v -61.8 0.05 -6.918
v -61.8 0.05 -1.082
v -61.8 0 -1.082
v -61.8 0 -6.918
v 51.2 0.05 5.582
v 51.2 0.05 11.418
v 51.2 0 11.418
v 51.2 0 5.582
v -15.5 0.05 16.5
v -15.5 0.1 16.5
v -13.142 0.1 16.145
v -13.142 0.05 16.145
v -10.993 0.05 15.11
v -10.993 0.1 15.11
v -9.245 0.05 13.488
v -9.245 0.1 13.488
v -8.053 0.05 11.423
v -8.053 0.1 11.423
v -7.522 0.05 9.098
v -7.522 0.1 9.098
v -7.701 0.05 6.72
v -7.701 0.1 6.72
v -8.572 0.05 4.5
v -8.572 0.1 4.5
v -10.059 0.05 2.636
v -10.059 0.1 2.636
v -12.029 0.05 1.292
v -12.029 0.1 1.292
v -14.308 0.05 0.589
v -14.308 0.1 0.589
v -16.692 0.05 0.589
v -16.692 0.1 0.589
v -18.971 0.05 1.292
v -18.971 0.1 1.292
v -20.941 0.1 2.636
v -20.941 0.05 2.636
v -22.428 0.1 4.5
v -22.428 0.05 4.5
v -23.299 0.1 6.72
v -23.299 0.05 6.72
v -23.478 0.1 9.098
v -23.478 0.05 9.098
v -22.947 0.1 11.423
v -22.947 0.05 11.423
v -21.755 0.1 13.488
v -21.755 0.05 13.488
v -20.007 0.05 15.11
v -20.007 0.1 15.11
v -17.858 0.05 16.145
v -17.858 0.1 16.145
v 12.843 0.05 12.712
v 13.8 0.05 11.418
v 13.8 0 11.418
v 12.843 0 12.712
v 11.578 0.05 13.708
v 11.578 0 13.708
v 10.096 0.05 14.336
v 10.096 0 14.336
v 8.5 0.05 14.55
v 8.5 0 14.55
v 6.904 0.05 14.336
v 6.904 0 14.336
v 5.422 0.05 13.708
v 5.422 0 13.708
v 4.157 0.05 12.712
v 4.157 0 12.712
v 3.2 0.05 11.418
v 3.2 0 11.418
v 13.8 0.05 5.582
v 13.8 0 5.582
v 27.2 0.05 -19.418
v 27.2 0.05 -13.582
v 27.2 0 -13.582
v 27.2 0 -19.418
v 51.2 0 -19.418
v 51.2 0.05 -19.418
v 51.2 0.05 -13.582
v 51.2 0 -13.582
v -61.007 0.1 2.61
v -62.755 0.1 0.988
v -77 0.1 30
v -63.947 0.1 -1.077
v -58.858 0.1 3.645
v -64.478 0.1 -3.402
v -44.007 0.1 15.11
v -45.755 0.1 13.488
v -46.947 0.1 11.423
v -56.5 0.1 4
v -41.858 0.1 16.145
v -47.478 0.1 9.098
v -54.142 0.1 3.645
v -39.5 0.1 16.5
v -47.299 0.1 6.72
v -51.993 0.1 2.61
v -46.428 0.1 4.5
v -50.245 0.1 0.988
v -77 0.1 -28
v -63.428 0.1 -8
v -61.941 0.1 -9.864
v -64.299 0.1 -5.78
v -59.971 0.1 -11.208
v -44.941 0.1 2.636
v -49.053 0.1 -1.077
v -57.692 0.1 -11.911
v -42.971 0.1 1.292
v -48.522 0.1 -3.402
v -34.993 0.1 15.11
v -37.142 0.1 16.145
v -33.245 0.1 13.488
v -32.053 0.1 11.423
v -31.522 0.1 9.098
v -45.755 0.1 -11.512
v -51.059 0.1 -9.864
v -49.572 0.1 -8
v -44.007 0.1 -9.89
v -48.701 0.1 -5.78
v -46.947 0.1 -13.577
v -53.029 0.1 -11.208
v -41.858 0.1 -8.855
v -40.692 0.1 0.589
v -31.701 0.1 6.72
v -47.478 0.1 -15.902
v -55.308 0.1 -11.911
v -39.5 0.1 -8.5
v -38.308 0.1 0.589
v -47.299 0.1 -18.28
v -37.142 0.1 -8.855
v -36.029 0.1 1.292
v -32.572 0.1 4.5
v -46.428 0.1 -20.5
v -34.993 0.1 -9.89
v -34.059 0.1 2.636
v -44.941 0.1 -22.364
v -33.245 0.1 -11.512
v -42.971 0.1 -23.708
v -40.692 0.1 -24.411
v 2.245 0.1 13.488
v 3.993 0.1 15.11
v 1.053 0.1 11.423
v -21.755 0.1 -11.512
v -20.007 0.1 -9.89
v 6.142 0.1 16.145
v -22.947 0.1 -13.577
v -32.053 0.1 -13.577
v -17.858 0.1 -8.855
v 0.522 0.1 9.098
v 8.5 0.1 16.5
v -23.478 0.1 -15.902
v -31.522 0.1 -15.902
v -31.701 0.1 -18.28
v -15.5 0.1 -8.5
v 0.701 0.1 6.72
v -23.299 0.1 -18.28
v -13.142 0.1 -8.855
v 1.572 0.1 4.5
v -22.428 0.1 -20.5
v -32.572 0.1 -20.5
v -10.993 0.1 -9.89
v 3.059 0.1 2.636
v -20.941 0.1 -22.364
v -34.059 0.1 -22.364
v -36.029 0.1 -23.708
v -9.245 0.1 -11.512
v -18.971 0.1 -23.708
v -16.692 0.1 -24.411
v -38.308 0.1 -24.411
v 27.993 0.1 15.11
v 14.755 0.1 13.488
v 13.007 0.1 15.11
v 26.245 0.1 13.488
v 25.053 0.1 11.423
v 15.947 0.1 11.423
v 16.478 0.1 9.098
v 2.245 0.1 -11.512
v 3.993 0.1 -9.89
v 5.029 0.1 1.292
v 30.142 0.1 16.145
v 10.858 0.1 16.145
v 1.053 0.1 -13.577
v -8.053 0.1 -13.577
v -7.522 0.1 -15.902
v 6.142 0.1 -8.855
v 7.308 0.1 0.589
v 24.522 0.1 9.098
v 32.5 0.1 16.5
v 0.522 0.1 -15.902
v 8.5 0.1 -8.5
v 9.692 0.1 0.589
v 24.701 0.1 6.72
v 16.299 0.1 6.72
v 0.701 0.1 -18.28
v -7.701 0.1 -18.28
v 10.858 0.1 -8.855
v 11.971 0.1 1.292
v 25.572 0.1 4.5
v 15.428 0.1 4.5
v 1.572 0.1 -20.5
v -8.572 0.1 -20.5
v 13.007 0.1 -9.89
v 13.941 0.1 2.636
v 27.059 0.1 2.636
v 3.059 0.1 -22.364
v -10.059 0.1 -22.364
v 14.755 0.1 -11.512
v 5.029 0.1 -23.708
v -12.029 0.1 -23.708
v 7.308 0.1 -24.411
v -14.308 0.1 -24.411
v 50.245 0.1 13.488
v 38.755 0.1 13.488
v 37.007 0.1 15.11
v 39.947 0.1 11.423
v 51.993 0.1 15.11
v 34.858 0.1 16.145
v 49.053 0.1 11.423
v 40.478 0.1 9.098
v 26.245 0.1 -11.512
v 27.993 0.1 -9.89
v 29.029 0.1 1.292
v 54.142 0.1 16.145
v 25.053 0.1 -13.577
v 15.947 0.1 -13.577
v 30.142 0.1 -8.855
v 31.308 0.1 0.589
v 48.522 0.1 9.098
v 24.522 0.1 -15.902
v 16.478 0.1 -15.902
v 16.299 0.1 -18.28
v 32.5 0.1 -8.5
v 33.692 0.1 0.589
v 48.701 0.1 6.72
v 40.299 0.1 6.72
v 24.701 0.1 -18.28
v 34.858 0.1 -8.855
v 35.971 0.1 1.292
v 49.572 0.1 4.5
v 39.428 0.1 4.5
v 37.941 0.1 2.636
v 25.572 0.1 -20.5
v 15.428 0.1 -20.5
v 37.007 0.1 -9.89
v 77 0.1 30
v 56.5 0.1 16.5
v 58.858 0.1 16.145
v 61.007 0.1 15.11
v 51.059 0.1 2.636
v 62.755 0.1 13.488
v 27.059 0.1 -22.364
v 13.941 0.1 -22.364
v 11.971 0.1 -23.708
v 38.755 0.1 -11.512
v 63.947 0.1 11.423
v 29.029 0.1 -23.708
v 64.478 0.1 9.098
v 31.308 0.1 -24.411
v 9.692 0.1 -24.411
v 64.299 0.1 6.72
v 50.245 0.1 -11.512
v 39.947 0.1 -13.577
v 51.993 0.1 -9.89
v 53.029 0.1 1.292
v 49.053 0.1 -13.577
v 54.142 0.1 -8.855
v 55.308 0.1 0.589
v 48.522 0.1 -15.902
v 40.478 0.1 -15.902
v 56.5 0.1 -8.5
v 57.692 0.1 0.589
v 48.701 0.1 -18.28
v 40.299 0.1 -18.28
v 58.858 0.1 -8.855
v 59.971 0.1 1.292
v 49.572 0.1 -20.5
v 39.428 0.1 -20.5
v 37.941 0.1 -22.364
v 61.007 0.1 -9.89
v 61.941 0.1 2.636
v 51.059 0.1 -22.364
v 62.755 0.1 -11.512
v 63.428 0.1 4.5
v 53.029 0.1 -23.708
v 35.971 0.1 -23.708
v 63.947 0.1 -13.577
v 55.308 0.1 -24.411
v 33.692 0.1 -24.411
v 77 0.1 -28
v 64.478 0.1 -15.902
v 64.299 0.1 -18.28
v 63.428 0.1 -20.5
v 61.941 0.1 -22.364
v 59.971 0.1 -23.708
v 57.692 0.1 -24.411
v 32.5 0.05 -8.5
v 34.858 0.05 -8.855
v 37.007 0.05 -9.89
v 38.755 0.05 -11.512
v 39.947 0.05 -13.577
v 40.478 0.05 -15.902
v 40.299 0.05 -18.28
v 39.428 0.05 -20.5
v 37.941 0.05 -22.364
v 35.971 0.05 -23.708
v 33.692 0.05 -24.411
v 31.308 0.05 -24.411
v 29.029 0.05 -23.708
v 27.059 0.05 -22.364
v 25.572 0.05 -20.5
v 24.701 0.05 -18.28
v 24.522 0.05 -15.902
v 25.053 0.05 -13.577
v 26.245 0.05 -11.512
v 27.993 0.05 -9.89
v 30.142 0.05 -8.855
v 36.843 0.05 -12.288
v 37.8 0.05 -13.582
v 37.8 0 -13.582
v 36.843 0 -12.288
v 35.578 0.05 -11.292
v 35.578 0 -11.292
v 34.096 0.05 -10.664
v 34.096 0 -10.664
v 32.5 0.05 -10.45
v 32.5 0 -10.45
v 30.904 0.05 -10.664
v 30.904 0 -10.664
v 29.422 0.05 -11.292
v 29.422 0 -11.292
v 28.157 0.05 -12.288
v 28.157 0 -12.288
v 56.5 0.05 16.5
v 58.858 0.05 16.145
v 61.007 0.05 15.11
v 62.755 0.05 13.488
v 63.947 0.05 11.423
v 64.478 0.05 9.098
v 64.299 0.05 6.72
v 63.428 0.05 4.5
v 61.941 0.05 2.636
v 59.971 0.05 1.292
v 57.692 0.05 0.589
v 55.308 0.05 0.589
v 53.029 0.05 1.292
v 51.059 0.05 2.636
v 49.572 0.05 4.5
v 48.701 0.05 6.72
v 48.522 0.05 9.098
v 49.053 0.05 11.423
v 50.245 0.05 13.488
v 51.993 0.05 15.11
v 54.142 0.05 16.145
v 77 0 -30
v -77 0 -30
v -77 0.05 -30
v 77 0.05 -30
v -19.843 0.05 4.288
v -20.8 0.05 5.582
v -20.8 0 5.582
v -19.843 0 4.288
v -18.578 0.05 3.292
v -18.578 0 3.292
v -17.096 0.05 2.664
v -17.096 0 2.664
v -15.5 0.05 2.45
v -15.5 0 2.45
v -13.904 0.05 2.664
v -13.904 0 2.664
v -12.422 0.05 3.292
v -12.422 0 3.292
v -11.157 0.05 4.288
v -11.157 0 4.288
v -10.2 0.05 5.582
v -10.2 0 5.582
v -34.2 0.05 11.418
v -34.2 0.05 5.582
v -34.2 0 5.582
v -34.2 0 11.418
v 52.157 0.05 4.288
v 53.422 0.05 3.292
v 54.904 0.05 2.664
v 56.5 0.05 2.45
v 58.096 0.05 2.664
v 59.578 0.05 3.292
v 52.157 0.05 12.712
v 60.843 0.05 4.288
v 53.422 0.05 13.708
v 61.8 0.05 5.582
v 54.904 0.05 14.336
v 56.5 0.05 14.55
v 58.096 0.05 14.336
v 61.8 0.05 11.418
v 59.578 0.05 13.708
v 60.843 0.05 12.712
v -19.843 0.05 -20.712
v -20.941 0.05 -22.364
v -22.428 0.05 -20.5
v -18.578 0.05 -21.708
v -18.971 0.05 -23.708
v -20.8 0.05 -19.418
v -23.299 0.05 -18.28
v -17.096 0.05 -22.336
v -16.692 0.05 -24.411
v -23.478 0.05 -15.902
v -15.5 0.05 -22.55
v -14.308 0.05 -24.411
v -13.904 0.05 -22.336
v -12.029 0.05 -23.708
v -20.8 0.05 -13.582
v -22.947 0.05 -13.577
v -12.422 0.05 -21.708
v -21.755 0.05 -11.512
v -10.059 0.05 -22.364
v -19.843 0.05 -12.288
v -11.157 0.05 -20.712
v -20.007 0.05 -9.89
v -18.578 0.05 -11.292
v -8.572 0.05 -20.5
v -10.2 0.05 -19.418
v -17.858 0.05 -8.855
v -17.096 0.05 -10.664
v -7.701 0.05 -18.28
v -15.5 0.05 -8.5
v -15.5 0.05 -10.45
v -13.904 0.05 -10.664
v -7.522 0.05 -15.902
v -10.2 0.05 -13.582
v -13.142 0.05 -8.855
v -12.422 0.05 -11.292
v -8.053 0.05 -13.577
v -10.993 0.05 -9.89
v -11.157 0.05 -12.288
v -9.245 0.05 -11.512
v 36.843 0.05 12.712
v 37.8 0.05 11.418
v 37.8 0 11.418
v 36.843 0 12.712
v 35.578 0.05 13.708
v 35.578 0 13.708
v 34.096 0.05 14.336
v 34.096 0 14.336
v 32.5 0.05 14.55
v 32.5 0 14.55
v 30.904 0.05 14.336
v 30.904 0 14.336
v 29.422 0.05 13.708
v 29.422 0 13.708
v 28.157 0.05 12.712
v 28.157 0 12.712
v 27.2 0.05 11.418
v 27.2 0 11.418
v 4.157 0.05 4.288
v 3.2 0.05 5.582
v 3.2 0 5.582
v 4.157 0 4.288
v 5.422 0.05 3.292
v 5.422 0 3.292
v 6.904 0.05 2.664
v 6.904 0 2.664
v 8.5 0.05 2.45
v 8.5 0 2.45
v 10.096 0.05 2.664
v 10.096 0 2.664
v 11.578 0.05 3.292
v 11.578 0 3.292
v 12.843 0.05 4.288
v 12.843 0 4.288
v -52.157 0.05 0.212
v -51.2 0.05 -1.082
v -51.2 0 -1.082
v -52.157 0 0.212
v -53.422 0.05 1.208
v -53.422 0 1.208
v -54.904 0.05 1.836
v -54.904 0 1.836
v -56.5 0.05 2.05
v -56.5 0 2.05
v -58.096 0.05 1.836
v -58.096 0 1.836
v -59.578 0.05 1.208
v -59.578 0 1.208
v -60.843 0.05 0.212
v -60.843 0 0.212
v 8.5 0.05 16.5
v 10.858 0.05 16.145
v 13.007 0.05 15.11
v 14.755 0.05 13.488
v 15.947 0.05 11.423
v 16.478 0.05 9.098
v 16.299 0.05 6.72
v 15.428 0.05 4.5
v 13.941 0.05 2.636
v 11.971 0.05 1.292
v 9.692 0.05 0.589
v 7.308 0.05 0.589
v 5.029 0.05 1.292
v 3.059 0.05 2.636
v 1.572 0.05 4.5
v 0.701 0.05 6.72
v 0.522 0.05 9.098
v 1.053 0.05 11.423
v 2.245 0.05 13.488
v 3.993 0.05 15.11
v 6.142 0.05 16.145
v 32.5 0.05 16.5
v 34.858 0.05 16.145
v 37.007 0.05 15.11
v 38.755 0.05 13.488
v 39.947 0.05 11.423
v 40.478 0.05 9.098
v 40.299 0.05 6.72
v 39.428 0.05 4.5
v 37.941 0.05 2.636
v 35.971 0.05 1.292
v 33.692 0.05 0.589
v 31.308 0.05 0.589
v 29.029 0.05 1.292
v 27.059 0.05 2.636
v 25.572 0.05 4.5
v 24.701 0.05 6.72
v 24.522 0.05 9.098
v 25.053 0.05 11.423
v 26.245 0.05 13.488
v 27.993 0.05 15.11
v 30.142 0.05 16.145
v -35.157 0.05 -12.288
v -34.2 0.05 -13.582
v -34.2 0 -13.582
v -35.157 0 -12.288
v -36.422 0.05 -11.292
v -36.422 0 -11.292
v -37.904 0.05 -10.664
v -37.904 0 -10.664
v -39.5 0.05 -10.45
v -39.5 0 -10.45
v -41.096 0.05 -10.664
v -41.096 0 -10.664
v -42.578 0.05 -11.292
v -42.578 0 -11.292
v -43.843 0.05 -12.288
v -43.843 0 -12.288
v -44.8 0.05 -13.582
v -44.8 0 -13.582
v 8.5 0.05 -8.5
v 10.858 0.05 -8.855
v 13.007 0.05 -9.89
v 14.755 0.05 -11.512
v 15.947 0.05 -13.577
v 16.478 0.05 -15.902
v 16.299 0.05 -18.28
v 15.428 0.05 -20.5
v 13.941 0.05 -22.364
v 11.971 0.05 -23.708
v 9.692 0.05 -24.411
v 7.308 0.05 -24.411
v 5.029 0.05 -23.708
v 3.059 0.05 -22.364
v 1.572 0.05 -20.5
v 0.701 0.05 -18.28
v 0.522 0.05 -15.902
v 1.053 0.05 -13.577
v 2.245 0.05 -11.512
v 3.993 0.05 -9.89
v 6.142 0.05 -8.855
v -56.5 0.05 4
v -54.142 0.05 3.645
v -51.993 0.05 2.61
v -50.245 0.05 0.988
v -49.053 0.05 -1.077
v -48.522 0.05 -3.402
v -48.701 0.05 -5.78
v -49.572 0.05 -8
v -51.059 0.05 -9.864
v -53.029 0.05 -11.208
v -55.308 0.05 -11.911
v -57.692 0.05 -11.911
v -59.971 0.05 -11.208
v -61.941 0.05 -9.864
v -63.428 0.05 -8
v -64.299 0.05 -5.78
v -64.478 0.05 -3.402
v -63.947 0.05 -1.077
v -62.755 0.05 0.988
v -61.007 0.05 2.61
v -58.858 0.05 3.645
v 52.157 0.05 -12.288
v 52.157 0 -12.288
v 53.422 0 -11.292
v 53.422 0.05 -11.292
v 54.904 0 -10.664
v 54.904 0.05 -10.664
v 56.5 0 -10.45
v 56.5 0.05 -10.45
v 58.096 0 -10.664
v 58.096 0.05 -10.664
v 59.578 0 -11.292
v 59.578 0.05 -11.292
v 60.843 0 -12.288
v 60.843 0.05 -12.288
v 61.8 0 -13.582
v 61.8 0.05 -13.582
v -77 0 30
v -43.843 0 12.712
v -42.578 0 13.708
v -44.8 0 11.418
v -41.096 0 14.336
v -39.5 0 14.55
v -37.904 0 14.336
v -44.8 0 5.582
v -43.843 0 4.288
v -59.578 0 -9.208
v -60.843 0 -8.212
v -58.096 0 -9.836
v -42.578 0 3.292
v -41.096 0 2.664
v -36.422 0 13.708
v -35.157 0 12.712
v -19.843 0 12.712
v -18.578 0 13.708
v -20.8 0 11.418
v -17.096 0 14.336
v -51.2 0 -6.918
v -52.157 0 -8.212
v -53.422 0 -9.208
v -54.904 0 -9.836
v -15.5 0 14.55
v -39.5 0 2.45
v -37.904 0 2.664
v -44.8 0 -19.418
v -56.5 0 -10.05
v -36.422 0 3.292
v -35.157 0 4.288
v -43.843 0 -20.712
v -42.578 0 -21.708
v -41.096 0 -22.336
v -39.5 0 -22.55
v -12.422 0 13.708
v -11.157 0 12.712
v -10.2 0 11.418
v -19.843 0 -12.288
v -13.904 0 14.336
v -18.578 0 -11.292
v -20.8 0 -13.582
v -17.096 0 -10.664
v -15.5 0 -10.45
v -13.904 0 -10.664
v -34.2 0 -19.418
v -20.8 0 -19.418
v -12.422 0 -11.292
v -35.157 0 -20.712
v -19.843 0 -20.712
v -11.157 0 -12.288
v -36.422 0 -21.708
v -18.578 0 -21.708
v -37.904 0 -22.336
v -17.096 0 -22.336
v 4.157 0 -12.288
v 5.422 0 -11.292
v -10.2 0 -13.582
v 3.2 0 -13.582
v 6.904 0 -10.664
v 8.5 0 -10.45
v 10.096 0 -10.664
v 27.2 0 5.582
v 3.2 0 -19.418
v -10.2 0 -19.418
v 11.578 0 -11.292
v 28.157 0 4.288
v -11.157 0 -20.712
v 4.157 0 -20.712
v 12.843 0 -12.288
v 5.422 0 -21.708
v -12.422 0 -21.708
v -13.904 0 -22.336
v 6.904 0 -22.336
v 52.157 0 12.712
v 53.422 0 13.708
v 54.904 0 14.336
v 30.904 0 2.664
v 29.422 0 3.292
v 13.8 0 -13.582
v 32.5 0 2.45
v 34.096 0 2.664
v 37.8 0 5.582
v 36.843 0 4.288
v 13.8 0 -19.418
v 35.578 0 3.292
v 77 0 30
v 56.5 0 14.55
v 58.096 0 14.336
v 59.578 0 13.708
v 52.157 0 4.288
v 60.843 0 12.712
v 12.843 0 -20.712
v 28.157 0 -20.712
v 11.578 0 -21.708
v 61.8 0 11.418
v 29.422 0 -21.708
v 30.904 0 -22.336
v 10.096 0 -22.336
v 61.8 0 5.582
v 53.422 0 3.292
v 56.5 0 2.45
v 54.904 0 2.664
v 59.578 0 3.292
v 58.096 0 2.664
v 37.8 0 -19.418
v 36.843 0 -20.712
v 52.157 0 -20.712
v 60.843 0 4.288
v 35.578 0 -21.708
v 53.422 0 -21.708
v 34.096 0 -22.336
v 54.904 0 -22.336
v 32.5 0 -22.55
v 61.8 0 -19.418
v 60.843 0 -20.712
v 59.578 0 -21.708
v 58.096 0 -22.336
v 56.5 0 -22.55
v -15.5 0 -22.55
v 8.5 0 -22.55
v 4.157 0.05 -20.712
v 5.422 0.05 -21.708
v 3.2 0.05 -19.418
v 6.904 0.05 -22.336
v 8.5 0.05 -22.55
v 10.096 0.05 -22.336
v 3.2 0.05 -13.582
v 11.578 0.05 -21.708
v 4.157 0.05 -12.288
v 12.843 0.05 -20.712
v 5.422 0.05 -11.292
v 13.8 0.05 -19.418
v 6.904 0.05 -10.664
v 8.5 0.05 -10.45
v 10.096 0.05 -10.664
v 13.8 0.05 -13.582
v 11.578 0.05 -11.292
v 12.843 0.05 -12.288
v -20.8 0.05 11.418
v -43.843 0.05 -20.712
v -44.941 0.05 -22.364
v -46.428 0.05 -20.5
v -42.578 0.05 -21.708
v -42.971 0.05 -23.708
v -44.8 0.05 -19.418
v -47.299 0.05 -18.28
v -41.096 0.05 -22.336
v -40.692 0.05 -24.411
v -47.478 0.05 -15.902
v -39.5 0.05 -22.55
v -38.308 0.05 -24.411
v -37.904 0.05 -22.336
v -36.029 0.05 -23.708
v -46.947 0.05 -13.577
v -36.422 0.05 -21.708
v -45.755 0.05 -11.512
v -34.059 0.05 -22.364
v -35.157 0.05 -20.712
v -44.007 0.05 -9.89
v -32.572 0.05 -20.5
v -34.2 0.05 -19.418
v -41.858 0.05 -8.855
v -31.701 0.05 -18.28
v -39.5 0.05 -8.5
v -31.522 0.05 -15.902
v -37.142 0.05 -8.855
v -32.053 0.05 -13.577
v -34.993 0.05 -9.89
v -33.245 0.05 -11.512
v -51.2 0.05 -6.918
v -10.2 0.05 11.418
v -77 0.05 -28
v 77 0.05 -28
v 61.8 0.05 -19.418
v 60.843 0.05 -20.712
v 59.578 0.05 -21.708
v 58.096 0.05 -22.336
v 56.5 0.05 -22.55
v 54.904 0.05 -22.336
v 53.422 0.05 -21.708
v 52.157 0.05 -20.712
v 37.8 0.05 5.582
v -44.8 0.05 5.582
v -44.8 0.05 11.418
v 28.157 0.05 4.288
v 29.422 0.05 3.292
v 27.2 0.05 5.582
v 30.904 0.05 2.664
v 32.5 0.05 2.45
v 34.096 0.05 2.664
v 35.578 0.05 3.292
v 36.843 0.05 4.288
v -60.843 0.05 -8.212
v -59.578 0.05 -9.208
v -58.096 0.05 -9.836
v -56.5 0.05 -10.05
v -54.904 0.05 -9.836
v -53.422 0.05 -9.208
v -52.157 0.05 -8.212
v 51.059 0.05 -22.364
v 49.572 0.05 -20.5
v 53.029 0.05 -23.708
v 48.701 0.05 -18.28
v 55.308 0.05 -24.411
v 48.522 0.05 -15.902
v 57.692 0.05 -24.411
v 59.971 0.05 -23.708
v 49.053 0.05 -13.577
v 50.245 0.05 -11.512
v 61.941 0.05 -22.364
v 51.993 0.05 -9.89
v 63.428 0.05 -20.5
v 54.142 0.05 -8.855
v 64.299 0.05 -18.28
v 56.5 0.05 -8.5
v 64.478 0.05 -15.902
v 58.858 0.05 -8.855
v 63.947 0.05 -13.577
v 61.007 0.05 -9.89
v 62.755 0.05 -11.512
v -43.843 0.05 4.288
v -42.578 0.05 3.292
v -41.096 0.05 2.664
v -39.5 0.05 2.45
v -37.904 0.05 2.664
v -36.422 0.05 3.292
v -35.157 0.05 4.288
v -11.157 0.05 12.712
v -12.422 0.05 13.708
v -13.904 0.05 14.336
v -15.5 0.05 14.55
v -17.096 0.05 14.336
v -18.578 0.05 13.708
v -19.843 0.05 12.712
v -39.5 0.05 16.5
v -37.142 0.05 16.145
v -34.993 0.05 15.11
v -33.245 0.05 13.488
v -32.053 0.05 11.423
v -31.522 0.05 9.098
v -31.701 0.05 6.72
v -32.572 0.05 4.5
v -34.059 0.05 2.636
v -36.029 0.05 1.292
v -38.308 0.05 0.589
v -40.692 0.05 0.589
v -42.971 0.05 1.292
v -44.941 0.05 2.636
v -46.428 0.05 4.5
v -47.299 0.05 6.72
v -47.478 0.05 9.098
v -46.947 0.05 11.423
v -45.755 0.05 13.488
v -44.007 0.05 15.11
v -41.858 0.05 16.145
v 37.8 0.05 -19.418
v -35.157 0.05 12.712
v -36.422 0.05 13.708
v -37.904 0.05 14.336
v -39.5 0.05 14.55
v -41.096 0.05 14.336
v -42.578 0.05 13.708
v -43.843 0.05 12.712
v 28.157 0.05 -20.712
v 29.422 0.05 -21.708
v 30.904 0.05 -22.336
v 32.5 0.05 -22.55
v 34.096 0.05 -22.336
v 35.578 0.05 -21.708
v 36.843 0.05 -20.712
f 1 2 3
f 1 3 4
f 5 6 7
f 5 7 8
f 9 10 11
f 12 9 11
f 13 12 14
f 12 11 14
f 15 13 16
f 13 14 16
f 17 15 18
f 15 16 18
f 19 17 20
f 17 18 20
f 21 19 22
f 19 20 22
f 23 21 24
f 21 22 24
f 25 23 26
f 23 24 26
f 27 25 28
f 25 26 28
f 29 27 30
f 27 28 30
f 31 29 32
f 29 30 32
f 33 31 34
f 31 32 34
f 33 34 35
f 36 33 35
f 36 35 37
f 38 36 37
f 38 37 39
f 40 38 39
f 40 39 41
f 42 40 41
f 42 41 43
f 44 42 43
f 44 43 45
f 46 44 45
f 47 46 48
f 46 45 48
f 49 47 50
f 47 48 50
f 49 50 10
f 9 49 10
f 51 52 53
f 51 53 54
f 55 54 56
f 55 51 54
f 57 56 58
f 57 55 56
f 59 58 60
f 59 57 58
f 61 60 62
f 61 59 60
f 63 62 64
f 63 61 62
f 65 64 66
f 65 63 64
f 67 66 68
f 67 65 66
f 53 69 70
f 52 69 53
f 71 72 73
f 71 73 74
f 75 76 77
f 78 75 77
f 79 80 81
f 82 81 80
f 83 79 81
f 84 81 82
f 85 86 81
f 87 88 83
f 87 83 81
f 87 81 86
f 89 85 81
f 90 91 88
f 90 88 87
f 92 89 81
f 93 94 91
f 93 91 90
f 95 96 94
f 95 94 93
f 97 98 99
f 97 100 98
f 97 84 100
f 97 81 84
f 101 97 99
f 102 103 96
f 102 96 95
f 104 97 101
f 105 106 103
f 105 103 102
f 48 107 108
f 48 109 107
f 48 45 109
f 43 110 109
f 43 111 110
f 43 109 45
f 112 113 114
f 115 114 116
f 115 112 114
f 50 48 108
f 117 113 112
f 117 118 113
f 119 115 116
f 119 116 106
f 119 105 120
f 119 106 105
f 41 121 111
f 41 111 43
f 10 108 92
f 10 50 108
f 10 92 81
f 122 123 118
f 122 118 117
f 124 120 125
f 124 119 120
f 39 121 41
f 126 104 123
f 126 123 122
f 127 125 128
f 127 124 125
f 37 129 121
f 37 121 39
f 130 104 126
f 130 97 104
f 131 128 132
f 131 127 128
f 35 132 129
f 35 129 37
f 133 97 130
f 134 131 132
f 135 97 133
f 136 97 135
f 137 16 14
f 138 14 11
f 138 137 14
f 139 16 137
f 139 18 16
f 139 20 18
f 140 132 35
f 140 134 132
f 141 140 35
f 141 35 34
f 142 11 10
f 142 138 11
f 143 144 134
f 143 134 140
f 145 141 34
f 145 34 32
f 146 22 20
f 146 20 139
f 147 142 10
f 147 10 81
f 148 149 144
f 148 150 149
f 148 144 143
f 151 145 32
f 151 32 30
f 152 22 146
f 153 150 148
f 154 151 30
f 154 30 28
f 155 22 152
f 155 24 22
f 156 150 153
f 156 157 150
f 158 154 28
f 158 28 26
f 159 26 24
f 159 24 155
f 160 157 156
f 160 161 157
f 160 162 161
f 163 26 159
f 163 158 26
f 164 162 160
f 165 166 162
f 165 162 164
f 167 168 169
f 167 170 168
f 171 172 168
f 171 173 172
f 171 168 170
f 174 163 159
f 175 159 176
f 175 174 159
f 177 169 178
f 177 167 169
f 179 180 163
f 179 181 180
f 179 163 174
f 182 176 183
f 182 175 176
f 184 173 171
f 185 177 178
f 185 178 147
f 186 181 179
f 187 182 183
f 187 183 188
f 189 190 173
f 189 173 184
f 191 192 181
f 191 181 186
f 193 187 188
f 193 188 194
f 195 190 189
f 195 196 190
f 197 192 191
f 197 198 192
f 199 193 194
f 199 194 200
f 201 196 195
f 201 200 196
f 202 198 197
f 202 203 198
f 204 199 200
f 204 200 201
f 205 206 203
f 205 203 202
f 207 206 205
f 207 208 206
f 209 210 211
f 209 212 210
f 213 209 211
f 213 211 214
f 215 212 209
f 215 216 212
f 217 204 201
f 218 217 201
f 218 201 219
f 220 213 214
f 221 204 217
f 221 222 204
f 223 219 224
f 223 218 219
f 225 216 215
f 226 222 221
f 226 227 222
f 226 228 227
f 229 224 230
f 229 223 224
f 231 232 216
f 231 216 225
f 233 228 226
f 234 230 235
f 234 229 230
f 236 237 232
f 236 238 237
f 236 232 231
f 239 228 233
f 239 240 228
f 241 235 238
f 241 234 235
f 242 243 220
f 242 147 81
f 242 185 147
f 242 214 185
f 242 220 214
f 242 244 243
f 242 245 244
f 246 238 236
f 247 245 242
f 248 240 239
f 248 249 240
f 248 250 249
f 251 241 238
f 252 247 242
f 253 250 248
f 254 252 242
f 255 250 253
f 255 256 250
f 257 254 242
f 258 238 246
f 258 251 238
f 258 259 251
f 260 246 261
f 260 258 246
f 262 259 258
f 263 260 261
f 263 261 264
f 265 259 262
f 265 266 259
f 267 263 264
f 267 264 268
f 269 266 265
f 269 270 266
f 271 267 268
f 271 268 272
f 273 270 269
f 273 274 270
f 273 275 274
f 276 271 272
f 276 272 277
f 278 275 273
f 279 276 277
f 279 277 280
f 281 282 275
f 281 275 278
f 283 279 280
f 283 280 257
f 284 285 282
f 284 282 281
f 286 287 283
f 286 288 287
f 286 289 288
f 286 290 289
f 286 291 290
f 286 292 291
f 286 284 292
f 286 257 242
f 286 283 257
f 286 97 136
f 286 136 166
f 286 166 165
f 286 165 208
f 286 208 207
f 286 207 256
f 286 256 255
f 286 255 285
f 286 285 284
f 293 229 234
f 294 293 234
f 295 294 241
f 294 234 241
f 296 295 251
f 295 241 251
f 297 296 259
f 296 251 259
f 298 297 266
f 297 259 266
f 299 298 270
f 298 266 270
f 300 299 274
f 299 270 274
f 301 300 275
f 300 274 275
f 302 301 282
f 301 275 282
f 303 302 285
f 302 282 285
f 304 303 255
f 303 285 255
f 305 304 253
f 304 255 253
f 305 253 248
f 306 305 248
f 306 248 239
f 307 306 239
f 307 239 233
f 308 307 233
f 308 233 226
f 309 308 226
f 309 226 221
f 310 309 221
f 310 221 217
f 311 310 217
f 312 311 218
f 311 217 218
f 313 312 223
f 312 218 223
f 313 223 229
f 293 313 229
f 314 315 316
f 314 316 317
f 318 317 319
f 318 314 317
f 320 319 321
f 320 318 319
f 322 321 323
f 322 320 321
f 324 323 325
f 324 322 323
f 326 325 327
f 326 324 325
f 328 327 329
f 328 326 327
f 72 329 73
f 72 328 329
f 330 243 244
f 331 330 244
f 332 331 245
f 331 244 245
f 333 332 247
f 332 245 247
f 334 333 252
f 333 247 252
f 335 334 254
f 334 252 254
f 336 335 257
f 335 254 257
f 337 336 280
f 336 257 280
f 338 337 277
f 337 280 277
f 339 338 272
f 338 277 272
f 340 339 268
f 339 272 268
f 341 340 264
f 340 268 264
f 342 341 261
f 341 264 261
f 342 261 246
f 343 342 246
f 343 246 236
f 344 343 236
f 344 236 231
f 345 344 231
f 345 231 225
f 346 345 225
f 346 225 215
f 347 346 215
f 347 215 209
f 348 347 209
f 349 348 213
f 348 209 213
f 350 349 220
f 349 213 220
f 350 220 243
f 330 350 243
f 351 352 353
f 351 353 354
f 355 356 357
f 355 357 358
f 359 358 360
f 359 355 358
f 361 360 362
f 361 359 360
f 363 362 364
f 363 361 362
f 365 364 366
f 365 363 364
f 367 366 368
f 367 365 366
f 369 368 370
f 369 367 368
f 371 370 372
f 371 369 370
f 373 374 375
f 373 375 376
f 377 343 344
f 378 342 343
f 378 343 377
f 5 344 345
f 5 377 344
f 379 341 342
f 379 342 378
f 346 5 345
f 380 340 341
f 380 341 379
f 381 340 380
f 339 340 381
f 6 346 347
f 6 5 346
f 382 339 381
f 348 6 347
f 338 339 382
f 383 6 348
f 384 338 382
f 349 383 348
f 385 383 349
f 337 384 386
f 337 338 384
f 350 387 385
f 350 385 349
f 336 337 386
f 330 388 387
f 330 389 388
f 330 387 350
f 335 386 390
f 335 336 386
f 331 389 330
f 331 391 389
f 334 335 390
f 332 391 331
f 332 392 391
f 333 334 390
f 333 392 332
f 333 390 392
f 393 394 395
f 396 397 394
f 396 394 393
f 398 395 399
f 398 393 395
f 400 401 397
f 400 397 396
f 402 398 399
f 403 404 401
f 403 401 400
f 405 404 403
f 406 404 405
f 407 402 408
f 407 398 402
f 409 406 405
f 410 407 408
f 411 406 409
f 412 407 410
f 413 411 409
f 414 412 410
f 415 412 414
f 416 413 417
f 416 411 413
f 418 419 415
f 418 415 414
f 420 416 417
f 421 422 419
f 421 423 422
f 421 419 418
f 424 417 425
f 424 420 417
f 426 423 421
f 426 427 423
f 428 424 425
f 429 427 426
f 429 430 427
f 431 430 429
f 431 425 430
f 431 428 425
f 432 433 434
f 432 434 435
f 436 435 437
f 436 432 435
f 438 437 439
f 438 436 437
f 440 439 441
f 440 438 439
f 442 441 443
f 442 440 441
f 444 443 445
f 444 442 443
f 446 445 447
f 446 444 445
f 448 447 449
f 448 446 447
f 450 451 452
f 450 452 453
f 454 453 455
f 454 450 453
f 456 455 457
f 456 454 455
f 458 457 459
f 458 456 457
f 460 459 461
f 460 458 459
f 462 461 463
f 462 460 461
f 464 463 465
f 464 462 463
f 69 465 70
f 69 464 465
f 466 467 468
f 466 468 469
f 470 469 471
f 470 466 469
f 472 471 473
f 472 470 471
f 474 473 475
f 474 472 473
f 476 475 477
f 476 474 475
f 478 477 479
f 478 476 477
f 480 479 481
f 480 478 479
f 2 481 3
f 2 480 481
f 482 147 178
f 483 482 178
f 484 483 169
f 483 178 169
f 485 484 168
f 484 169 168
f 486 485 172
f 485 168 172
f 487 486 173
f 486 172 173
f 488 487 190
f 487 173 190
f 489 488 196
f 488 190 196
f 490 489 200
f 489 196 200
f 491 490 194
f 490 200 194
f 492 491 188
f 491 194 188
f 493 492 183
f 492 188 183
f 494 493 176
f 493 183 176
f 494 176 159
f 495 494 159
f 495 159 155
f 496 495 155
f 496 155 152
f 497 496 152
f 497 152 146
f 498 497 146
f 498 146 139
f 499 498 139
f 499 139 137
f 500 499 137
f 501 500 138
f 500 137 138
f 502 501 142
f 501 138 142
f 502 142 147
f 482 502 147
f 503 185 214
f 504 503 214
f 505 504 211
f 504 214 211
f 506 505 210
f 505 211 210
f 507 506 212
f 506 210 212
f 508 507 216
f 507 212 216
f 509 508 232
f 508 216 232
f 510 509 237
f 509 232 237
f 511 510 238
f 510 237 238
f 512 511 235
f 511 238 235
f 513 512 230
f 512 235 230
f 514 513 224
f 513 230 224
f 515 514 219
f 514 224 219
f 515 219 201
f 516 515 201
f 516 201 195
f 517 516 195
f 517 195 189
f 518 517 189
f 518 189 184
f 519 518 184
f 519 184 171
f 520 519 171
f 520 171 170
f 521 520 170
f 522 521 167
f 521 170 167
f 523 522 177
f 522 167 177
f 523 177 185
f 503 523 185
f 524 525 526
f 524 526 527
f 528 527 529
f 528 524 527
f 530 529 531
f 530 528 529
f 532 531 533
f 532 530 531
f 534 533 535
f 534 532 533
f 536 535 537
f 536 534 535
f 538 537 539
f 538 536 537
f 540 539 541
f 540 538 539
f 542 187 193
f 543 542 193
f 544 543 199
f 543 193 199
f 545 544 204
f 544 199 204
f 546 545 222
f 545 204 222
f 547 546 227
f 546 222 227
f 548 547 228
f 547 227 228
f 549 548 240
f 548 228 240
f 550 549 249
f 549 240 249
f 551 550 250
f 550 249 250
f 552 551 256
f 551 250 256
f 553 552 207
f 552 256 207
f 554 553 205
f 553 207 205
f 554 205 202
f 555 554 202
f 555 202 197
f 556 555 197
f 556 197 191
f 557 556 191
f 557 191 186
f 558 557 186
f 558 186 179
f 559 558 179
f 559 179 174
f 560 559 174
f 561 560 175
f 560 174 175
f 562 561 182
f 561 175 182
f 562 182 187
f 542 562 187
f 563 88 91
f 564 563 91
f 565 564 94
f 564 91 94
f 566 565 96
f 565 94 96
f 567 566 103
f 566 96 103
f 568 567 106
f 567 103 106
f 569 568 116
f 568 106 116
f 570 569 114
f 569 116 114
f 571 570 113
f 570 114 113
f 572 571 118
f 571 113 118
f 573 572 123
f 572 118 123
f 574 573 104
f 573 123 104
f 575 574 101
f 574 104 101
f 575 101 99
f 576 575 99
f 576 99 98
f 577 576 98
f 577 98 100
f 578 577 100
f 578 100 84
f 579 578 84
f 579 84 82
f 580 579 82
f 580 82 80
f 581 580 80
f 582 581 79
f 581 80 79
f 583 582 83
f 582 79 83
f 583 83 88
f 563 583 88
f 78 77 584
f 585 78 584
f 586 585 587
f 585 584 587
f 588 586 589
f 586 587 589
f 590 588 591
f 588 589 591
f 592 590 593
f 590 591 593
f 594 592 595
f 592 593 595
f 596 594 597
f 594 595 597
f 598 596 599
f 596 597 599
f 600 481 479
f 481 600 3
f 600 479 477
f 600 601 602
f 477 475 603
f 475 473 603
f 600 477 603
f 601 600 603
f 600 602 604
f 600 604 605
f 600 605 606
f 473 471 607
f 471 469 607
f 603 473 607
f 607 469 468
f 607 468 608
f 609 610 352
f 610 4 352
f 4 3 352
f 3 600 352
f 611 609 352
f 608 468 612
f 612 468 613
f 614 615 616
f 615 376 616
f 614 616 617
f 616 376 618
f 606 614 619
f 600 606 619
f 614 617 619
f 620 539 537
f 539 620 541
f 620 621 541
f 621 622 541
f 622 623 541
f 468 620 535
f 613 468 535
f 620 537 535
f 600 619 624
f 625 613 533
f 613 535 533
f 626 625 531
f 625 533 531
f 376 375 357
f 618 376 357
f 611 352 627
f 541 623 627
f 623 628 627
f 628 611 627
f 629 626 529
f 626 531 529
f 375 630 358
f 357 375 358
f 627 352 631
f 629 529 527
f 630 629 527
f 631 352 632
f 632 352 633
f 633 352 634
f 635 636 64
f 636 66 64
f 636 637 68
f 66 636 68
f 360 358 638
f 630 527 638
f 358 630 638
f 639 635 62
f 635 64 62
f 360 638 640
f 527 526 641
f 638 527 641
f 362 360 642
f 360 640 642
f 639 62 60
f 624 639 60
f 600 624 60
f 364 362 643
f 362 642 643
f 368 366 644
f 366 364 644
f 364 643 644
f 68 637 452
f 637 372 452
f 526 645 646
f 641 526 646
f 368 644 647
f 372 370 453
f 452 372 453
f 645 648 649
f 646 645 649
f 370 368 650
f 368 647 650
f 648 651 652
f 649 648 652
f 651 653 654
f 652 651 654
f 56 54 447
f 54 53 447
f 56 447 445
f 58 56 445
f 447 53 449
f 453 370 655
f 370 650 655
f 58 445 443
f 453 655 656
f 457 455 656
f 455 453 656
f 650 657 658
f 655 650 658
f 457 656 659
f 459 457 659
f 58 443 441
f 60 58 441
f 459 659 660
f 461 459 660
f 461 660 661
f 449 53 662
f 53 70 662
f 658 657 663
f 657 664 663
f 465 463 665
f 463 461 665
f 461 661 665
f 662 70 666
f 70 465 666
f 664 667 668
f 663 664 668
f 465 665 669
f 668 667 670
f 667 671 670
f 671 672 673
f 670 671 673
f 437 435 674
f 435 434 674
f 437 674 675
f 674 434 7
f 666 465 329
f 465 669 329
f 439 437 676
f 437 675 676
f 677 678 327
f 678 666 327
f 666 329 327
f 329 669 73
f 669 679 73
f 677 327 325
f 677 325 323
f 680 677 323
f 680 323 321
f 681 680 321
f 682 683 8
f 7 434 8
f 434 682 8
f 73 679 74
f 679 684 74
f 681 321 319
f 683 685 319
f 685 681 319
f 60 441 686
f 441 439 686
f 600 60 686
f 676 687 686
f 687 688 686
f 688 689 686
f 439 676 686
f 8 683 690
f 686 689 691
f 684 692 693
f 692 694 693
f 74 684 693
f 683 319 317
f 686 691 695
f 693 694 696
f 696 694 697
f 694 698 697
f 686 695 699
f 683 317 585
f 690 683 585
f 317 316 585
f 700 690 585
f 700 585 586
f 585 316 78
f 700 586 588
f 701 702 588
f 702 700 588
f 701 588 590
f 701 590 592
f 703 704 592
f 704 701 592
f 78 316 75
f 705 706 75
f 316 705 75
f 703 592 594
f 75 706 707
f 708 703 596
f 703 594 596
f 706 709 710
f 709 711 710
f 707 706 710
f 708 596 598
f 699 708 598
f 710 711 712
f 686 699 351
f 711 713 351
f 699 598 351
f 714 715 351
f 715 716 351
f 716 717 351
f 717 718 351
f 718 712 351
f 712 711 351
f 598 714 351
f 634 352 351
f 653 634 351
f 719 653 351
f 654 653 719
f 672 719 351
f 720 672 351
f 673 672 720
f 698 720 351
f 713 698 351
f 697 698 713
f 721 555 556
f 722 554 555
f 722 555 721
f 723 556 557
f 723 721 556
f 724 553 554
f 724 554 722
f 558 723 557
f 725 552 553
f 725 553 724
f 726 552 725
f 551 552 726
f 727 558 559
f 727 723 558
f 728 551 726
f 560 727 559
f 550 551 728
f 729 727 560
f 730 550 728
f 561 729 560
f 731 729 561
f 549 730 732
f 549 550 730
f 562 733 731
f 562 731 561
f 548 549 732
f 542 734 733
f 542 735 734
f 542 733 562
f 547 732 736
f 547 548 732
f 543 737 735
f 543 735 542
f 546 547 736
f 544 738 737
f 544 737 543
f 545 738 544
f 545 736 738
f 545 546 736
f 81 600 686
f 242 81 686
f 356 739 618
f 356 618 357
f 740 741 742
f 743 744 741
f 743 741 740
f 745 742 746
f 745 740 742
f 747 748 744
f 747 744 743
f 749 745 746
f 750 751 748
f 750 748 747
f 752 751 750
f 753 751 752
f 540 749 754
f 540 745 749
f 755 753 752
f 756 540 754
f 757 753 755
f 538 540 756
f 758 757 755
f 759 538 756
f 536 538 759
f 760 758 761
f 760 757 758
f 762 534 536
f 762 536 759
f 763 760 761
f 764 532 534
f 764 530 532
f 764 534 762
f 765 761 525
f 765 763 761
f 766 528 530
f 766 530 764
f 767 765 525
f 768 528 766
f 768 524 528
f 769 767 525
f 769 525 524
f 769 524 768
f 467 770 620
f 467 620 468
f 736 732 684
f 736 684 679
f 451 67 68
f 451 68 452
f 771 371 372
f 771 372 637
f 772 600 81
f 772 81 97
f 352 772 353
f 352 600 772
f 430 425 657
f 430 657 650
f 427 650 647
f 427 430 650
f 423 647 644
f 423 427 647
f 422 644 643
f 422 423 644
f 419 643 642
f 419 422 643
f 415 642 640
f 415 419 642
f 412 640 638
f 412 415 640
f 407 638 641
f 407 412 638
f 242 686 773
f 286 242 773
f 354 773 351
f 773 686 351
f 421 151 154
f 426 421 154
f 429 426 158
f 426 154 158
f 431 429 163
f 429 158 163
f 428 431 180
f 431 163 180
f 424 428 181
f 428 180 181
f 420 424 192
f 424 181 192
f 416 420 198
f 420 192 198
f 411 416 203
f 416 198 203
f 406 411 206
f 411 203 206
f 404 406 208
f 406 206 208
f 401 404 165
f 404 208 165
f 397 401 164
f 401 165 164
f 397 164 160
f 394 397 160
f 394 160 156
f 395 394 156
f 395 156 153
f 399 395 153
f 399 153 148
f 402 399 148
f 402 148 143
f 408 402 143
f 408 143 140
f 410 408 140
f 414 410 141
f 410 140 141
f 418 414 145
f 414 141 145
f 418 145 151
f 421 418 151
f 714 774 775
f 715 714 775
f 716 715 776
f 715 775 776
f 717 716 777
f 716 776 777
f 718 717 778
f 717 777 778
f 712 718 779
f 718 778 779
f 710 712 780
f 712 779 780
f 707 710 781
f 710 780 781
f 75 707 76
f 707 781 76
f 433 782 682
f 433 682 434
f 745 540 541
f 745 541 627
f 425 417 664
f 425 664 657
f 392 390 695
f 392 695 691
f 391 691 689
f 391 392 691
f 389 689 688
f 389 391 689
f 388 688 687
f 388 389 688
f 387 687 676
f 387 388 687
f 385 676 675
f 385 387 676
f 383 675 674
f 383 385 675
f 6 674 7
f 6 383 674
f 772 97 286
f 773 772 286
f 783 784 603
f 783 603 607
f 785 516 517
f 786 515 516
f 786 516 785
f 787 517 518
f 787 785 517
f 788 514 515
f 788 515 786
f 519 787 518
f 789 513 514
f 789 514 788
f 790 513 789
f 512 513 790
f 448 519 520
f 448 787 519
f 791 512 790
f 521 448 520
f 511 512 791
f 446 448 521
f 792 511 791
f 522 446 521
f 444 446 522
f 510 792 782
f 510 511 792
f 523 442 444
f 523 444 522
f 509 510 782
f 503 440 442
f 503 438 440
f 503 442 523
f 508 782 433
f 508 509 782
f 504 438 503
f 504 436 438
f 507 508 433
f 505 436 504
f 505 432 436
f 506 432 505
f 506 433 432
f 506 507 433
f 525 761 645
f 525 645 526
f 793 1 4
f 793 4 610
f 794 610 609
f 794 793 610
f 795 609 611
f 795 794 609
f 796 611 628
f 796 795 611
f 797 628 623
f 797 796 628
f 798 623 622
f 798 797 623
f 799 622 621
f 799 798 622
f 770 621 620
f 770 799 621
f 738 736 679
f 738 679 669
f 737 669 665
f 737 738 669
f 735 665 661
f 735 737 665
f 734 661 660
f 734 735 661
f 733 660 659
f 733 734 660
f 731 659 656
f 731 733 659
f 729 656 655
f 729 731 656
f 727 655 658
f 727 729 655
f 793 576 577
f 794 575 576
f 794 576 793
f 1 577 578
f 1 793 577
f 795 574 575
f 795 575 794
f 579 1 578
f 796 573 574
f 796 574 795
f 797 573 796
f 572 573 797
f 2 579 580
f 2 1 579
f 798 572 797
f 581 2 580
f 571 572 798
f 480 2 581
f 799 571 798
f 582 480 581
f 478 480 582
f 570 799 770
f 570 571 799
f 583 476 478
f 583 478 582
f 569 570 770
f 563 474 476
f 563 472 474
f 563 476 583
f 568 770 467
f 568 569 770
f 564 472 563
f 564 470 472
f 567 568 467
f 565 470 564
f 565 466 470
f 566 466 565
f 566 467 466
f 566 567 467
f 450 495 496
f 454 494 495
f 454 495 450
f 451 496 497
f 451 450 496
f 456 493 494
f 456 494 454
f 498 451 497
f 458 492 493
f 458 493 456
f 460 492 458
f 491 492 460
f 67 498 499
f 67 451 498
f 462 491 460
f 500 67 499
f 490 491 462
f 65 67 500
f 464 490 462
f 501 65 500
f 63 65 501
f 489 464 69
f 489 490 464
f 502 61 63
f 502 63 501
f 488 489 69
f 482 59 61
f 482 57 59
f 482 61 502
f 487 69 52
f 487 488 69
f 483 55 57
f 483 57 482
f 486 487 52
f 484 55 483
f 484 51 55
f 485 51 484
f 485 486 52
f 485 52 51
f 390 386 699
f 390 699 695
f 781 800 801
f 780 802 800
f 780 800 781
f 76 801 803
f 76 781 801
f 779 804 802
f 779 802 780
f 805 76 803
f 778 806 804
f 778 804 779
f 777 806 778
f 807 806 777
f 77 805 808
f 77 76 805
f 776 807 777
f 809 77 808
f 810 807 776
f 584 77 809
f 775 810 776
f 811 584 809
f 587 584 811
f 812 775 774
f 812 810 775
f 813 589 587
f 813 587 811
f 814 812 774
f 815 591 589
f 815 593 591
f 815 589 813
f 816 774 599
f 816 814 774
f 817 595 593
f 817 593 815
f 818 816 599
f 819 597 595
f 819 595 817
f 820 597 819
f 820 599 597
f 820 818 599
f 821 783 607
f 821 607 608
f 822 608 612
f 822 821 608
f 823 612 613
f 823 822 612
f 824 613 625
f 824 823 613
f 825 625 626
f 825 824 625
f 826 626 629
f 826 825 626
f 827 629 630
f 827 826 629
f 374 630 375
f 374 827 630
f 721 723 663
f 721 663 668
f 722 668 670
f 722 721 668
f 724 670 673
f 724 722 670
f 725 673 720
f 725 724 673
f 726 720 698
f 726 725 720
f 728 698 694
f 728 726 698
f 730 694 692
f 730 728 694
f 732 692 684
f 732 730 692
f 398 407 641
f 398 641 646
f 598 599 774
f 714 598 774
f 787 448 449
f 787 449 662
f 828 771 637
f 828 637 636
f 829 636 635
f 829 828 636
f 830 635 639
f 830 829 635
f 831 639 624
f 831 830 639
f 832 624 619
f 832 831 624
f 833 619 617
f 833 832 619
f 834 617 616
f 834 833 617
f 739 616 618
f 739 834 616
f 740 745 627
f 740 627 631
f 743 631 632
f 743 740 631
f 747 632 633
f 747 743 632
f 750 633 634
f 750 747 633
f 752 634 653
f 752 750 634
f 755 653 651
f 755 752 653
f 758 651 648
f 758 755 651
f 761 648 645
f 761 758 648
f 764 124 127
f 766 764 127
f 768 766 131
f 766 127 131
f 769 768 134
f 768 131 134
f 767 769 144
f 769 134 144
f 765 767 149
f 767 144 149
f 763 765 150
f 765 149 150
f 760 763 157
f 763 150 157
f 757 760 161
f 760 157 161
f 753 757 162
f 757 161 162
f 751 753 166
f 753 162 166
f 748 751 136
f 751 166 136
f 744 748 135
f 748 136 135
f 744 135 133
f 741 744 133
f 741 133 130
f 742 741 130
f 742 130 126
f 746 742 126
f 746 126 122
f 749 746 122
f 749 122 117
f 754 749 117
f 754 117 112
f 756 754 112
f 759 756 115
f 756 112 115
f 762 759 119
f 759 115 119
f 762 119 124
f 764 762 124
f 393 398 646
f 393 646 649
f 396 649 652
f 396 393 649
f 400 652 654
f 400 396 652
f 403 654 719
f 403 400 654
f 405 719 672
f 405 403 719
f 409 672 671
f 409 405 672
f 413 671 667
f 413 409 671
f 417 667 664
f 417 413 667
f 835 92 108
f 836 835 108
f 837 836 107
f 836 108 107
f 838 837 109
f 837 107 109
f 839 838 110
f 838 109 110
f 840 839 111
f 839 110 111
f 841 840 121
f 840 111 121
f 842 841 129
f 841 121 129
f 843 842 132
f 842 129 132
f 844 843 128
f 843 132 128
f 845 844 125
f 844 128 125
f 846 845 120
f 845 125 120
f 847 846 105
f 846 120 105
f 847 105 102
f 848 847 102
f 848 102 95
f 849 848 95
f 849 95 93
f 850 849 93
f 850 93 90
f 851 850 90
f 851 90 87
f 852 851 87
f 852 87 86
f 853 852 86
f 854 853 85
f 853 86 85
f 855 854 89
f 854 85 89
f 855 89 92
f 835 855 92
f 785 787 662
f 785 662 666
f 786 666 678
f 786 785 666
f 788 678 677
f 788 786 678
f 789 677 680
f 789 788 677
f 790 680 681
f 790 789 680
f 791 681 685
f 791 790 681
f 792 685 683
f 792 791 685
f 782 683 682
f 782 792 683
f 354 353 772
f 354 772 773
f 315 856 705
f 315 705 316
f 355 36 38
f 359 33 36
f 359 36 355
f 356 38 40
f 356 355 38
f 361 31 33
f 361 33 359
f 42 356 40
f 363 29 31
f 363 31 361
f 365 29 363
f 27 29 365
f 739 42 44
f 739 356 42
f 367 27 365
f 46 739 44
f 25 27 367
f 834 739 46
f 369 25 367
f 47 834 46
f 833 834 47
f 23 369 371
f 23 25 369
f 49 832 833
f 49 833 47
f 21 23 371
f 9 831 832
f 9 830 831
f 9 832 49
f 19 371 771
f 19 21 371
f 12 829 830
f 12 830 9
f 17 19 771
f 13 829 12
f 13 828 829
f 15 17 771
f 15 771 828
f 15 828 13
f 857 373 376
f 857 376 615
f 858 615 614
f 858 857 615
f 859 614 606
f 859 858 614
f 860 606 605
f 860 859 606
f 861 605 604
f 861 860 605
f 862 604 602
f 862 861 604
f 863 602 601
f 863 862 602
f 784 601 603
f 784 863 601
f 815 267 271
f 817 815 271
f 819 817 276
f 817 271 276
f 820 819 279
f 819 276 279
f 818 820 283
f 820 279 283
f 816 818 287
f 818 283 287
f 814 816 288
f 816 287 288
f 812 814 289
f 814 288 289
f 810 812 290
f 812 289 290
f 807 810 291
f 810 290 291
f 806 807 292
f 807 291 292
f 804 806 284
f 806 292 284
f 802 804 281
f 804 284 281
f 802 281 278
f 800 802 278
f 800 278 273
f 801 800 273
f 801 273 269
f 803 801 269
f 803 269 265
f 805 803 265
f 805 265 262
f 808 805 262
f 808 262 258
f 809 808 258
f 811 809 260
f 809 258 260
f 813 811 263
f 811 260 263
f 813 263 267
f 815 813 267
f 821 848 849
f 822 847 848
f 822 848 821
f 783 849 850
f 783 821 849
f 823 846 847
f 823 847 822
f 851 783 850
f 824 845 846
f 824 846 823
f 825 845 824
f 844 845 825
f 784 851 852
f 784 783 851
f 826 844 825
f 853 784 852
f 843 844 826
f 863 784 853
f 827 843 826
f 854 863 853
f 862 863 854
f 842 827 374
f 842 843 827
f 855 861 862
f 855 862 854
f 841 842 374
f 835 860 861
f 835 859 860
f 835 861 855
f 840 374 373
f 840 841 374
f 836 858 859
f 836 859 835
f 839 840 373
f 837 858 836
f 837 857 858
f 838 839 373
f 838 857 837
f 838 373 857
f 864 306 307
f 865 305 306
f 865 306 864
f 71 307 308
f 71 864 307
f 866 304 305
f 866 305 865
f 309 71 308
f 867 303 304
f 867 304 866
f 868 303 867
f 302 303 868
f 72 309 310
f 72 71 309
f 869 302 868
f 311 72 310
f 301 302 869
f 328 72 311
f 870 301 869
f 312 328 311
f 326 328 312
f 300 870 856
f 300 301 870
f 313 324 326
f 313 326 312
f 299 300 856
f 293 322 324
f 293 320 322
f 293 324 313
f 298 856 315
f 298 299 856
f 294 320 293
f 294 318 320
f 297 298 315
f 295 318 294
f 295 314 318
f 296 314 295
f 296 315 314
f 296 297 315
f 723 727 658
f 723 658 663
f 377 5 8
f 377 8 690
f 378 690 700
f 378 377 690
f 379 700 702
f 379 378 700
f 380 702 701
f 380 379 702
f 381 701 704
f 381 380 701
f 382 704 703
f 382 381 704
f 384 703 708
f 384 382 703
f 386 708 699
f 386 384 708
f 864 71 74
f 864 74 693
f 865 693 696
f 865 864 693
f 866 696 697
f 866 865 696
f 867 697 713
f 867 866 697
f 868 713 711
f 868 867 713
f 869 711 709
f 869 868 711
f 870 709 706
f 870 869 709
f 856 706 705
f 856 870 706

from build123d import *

# Parameters (mm, degrees)
SKETCH1_W           = 154
SKETCH1_H           = 60
BOSS_EXTRUDE1_DEPTH = 0.1
CUT_EXTRUDE1_DEPTH  = 83.63782427
SKETCH3_R           = 8
SKETCH3_W           = 154
SKETCH3_H           = 2
CUT_EXTRUDE2_DEPTH  = 0.05


with BuildPart() as part:
    # Sketch1 → Boss-Extrude1 (new body)
    with BuildSketch(Plane(origin=(0, 0, 0), x_dir=(1, 0, 0), z_dir=(0, 1, 0))):
        Rectangle(SKETCH1_W, SKETCH1_H)
    extrude(amount=BOSS_EXTRUDE1_DEPTH)

    # Sketch2 → Cut-Extrude1 (cut, through all)
    with BuildSketch(Plane(origin=(0, 0.1, 0), x_dir=(1, 0, 0), z_dir=(0, 1, 0))):
        with BuildLine():
            Line((51.2, 19.417618892), (51.2, 13.582381108))
            ThreePointArc((51.2, 13.582381108), (56.5, 10.45), (61.8, 13.582381108))
            Line((61.8, 13.582381108), (61.8, 19.417618892))
            ThreePointArc((61.8, 19.417618892), (56.5, 22.55), (51.2, 19.417618892))
        make_face()
        with BuildLine():
            Line((37.8, 19.417618892), (37.8, 13.582381108))
            ThreePointArc((37.8, 13.582381108), (32.5, 10.45), (27.2, 13.582381108))
            Line((27.2, 13.582381108), (27.2, 19.417618892))
            ThreePointArc((27.2, 19.417618892), (32.5, 22.55), (37.8, 19.417618892))
        make_face()
        with BuildLine():
            Line((13.8, 19.417618892), (13.8, 13.582381108))
            ThreePointArc((13.8, 13.582381108), (8.5, 10.45), (3.2, 13.582381108))
            Line((3.2, 13.582381108), (3.2, 19.417618892))
            ThreePointArc((3.2, 19.417618892), (8.5, 22.55), (13.8, 19.417618892))
        make_face()
        with BuildLine():
            Line((-10.2, 19.417618892), (-10.2, 13.582381108))
            ThreePointArc((-10.2, 13.582381108), (-15.5, 10.45), (-20.8, 13.582381108))
            Line((-20.8, 13.582381108), (-20.8, 19.417618892))
            ThreePointArc((-20.8, 19.417618892), (-15.5, 22.55), (-10.2, 19.417618892))
        make_face()
        with BuildLine():
            Line((-34.2, 19.417618892), (-34.2, 13.582381108))
            ThreePointArc((-34.2, 13.582381108), (-39.5, 10.45), (-44.8, 13.582381108))
            Line((-44.8, 13.582381108), (-44.8, 19.417618892))
            ThreePointArc((-44.8, 19.417618892), (-39.5, 22.55), (-34.2, 19.417618892))
        make_face()
        with BuildLine():
            Line((37.8, -5.582381108), (37.8, -11.417618892))
            ThreePointArc((37.8, -11.417618892), (32.5, -14.55), (27.2, -11.417618892))
            Line((27.2, -11.417618892), (27.2, -5.582381108))
            ThreePointArc((27.2, -5.582381108), (32.5, -2.45), (37.8, -5.582381108))
        make_face()
        with BuildLine():
            Line((13.8, -5.582381108), (13.8, -11.417618892))
            ThreePointArc((13.8, -11.417618892), (8.5, -14.55), (3.2, -11.417618892))
            Line((3.2, -11.417618892), (3.2, -5.582381108))
            ThreePointArc((3.2, -5.582381108), (8.5, -2.45), (13.8, -5.582381108))
        make_face()
        with BuildLine():
            Line((-10.2, -5.582381108), (-10.2, -11.417618892))
            ThreePointArc((-10.2, -11.417618892), (-15.5, -14.55), (-20.8, -11.417618892))
            Line((-20.8, -11.417618892), (-20.8, -5.582381108))
            ThreePointArc((-20.8, -5.582381108), (-15.5, -2.45), (-10.2, -5.582381108))
        make_face()
        with BuildLine():
            Line((-34.2, -5.582381108), (-34.2, -11.417618892))
            ThreePointArc((-34.2, -11.417618892), (-39.5, -14.55), (-44.8, -11.417618892))
            Line((-44.8, -11.417618892), (-44.8, -5.582381108))
            ThreePointArc((-44.8, -5.582381108), (-39.5, -2.45), (-34.2, -5.582381108))
        make_face()
        with BuildLine():
            Line((61.8, -5.582381108), (61.8, -11.417618892))
            ThreePointArc((61.8, -11.417618892), (56.5, -14.55), (51.2, -11.417618892))
            Line((51.2, -11.417618892), (51.2, -5.582381108))
            ThreePointArc((51.2, -5.582381108), (56.5, -2.45), (61.8, -5.582381108))
        make_face()
        with BuildLine():
            Line((-51.2, 6.917618892), (-51.2, 1.082381108))
            ThreePointArc((-51.2, 1.082381108), (-56.5, -2.05), (-61.8, 1.082381108))
            Line((-61.8, 1.082381108), (-61.8, 6.917618892))
            ThreePointArc((-61.8, 6.917618892), (-56.5, 10.05), (-51.2, 6.917618892))
        make_face()
    extrude(amount=-CUT_EXTRUDE1_DEPTH, mode=Mode.SUBTRACT)

    # Sketch3 → Cut-Extrude2 (cut)
    with BuildSketch(Plane(origin=(0, 0.1, 0), x_dir=(1, 0, 0), z_dir=(0, 1, 0))):
        with Locations(Location((-56.5, 4, 0), (0, 0, 270))):
            Circle(SKETCH3_R)
        with Locations(Location((56.5, 16.5, 0), (0, 0, 270))):
            Circle(SKETCH3_R)
        with Locations(Location((32.5, 16.5, 0), (0, 0, 270))):
            Circle(SKETCH3_R)
        with Locations(Location((8.5, 16.5, 0), (0, 0, 270))):
            Circle(SKETCH3_R)
        with Locations(Location((-15.5, 16.5, 0), (0, 0, 270))):
            Circle(SKETCH3_R)
        with Locations(Location((-39.5, 16.5, 0), (0, 0, 270))):
            Circle(SKETCH3_R)
        with Locations(Location((32.5, -8.5, 0), (0, 0, 270))):
            Circle(SKETCH3_R)
        with Locations(Location((8.5, -8.5, 0), (0, 0, 270))):
            Circle(SKETCH3_R)
        with Locations(Location((-15.5, -8.5, 0), (0, 0, 270))):
            Circle(SKETCH3_R)
        with Locations(Location((-39.5, -8.5, 0), (0, 0, 270))):
            Circle(SKETCH3_R)
        with Locations(Location((56.5, -8.5, 0), (0, 0, 270))):
            Circle(SKETCH3_R)
        with Locations((0, 29)):
            Rectangle(SKETCH3_W, SKETCH3_H)
    extrude(amount=-CUT_EXTRUDE2_DEPTH, mode=Mode.SUBTRACT)


solid = part.part
